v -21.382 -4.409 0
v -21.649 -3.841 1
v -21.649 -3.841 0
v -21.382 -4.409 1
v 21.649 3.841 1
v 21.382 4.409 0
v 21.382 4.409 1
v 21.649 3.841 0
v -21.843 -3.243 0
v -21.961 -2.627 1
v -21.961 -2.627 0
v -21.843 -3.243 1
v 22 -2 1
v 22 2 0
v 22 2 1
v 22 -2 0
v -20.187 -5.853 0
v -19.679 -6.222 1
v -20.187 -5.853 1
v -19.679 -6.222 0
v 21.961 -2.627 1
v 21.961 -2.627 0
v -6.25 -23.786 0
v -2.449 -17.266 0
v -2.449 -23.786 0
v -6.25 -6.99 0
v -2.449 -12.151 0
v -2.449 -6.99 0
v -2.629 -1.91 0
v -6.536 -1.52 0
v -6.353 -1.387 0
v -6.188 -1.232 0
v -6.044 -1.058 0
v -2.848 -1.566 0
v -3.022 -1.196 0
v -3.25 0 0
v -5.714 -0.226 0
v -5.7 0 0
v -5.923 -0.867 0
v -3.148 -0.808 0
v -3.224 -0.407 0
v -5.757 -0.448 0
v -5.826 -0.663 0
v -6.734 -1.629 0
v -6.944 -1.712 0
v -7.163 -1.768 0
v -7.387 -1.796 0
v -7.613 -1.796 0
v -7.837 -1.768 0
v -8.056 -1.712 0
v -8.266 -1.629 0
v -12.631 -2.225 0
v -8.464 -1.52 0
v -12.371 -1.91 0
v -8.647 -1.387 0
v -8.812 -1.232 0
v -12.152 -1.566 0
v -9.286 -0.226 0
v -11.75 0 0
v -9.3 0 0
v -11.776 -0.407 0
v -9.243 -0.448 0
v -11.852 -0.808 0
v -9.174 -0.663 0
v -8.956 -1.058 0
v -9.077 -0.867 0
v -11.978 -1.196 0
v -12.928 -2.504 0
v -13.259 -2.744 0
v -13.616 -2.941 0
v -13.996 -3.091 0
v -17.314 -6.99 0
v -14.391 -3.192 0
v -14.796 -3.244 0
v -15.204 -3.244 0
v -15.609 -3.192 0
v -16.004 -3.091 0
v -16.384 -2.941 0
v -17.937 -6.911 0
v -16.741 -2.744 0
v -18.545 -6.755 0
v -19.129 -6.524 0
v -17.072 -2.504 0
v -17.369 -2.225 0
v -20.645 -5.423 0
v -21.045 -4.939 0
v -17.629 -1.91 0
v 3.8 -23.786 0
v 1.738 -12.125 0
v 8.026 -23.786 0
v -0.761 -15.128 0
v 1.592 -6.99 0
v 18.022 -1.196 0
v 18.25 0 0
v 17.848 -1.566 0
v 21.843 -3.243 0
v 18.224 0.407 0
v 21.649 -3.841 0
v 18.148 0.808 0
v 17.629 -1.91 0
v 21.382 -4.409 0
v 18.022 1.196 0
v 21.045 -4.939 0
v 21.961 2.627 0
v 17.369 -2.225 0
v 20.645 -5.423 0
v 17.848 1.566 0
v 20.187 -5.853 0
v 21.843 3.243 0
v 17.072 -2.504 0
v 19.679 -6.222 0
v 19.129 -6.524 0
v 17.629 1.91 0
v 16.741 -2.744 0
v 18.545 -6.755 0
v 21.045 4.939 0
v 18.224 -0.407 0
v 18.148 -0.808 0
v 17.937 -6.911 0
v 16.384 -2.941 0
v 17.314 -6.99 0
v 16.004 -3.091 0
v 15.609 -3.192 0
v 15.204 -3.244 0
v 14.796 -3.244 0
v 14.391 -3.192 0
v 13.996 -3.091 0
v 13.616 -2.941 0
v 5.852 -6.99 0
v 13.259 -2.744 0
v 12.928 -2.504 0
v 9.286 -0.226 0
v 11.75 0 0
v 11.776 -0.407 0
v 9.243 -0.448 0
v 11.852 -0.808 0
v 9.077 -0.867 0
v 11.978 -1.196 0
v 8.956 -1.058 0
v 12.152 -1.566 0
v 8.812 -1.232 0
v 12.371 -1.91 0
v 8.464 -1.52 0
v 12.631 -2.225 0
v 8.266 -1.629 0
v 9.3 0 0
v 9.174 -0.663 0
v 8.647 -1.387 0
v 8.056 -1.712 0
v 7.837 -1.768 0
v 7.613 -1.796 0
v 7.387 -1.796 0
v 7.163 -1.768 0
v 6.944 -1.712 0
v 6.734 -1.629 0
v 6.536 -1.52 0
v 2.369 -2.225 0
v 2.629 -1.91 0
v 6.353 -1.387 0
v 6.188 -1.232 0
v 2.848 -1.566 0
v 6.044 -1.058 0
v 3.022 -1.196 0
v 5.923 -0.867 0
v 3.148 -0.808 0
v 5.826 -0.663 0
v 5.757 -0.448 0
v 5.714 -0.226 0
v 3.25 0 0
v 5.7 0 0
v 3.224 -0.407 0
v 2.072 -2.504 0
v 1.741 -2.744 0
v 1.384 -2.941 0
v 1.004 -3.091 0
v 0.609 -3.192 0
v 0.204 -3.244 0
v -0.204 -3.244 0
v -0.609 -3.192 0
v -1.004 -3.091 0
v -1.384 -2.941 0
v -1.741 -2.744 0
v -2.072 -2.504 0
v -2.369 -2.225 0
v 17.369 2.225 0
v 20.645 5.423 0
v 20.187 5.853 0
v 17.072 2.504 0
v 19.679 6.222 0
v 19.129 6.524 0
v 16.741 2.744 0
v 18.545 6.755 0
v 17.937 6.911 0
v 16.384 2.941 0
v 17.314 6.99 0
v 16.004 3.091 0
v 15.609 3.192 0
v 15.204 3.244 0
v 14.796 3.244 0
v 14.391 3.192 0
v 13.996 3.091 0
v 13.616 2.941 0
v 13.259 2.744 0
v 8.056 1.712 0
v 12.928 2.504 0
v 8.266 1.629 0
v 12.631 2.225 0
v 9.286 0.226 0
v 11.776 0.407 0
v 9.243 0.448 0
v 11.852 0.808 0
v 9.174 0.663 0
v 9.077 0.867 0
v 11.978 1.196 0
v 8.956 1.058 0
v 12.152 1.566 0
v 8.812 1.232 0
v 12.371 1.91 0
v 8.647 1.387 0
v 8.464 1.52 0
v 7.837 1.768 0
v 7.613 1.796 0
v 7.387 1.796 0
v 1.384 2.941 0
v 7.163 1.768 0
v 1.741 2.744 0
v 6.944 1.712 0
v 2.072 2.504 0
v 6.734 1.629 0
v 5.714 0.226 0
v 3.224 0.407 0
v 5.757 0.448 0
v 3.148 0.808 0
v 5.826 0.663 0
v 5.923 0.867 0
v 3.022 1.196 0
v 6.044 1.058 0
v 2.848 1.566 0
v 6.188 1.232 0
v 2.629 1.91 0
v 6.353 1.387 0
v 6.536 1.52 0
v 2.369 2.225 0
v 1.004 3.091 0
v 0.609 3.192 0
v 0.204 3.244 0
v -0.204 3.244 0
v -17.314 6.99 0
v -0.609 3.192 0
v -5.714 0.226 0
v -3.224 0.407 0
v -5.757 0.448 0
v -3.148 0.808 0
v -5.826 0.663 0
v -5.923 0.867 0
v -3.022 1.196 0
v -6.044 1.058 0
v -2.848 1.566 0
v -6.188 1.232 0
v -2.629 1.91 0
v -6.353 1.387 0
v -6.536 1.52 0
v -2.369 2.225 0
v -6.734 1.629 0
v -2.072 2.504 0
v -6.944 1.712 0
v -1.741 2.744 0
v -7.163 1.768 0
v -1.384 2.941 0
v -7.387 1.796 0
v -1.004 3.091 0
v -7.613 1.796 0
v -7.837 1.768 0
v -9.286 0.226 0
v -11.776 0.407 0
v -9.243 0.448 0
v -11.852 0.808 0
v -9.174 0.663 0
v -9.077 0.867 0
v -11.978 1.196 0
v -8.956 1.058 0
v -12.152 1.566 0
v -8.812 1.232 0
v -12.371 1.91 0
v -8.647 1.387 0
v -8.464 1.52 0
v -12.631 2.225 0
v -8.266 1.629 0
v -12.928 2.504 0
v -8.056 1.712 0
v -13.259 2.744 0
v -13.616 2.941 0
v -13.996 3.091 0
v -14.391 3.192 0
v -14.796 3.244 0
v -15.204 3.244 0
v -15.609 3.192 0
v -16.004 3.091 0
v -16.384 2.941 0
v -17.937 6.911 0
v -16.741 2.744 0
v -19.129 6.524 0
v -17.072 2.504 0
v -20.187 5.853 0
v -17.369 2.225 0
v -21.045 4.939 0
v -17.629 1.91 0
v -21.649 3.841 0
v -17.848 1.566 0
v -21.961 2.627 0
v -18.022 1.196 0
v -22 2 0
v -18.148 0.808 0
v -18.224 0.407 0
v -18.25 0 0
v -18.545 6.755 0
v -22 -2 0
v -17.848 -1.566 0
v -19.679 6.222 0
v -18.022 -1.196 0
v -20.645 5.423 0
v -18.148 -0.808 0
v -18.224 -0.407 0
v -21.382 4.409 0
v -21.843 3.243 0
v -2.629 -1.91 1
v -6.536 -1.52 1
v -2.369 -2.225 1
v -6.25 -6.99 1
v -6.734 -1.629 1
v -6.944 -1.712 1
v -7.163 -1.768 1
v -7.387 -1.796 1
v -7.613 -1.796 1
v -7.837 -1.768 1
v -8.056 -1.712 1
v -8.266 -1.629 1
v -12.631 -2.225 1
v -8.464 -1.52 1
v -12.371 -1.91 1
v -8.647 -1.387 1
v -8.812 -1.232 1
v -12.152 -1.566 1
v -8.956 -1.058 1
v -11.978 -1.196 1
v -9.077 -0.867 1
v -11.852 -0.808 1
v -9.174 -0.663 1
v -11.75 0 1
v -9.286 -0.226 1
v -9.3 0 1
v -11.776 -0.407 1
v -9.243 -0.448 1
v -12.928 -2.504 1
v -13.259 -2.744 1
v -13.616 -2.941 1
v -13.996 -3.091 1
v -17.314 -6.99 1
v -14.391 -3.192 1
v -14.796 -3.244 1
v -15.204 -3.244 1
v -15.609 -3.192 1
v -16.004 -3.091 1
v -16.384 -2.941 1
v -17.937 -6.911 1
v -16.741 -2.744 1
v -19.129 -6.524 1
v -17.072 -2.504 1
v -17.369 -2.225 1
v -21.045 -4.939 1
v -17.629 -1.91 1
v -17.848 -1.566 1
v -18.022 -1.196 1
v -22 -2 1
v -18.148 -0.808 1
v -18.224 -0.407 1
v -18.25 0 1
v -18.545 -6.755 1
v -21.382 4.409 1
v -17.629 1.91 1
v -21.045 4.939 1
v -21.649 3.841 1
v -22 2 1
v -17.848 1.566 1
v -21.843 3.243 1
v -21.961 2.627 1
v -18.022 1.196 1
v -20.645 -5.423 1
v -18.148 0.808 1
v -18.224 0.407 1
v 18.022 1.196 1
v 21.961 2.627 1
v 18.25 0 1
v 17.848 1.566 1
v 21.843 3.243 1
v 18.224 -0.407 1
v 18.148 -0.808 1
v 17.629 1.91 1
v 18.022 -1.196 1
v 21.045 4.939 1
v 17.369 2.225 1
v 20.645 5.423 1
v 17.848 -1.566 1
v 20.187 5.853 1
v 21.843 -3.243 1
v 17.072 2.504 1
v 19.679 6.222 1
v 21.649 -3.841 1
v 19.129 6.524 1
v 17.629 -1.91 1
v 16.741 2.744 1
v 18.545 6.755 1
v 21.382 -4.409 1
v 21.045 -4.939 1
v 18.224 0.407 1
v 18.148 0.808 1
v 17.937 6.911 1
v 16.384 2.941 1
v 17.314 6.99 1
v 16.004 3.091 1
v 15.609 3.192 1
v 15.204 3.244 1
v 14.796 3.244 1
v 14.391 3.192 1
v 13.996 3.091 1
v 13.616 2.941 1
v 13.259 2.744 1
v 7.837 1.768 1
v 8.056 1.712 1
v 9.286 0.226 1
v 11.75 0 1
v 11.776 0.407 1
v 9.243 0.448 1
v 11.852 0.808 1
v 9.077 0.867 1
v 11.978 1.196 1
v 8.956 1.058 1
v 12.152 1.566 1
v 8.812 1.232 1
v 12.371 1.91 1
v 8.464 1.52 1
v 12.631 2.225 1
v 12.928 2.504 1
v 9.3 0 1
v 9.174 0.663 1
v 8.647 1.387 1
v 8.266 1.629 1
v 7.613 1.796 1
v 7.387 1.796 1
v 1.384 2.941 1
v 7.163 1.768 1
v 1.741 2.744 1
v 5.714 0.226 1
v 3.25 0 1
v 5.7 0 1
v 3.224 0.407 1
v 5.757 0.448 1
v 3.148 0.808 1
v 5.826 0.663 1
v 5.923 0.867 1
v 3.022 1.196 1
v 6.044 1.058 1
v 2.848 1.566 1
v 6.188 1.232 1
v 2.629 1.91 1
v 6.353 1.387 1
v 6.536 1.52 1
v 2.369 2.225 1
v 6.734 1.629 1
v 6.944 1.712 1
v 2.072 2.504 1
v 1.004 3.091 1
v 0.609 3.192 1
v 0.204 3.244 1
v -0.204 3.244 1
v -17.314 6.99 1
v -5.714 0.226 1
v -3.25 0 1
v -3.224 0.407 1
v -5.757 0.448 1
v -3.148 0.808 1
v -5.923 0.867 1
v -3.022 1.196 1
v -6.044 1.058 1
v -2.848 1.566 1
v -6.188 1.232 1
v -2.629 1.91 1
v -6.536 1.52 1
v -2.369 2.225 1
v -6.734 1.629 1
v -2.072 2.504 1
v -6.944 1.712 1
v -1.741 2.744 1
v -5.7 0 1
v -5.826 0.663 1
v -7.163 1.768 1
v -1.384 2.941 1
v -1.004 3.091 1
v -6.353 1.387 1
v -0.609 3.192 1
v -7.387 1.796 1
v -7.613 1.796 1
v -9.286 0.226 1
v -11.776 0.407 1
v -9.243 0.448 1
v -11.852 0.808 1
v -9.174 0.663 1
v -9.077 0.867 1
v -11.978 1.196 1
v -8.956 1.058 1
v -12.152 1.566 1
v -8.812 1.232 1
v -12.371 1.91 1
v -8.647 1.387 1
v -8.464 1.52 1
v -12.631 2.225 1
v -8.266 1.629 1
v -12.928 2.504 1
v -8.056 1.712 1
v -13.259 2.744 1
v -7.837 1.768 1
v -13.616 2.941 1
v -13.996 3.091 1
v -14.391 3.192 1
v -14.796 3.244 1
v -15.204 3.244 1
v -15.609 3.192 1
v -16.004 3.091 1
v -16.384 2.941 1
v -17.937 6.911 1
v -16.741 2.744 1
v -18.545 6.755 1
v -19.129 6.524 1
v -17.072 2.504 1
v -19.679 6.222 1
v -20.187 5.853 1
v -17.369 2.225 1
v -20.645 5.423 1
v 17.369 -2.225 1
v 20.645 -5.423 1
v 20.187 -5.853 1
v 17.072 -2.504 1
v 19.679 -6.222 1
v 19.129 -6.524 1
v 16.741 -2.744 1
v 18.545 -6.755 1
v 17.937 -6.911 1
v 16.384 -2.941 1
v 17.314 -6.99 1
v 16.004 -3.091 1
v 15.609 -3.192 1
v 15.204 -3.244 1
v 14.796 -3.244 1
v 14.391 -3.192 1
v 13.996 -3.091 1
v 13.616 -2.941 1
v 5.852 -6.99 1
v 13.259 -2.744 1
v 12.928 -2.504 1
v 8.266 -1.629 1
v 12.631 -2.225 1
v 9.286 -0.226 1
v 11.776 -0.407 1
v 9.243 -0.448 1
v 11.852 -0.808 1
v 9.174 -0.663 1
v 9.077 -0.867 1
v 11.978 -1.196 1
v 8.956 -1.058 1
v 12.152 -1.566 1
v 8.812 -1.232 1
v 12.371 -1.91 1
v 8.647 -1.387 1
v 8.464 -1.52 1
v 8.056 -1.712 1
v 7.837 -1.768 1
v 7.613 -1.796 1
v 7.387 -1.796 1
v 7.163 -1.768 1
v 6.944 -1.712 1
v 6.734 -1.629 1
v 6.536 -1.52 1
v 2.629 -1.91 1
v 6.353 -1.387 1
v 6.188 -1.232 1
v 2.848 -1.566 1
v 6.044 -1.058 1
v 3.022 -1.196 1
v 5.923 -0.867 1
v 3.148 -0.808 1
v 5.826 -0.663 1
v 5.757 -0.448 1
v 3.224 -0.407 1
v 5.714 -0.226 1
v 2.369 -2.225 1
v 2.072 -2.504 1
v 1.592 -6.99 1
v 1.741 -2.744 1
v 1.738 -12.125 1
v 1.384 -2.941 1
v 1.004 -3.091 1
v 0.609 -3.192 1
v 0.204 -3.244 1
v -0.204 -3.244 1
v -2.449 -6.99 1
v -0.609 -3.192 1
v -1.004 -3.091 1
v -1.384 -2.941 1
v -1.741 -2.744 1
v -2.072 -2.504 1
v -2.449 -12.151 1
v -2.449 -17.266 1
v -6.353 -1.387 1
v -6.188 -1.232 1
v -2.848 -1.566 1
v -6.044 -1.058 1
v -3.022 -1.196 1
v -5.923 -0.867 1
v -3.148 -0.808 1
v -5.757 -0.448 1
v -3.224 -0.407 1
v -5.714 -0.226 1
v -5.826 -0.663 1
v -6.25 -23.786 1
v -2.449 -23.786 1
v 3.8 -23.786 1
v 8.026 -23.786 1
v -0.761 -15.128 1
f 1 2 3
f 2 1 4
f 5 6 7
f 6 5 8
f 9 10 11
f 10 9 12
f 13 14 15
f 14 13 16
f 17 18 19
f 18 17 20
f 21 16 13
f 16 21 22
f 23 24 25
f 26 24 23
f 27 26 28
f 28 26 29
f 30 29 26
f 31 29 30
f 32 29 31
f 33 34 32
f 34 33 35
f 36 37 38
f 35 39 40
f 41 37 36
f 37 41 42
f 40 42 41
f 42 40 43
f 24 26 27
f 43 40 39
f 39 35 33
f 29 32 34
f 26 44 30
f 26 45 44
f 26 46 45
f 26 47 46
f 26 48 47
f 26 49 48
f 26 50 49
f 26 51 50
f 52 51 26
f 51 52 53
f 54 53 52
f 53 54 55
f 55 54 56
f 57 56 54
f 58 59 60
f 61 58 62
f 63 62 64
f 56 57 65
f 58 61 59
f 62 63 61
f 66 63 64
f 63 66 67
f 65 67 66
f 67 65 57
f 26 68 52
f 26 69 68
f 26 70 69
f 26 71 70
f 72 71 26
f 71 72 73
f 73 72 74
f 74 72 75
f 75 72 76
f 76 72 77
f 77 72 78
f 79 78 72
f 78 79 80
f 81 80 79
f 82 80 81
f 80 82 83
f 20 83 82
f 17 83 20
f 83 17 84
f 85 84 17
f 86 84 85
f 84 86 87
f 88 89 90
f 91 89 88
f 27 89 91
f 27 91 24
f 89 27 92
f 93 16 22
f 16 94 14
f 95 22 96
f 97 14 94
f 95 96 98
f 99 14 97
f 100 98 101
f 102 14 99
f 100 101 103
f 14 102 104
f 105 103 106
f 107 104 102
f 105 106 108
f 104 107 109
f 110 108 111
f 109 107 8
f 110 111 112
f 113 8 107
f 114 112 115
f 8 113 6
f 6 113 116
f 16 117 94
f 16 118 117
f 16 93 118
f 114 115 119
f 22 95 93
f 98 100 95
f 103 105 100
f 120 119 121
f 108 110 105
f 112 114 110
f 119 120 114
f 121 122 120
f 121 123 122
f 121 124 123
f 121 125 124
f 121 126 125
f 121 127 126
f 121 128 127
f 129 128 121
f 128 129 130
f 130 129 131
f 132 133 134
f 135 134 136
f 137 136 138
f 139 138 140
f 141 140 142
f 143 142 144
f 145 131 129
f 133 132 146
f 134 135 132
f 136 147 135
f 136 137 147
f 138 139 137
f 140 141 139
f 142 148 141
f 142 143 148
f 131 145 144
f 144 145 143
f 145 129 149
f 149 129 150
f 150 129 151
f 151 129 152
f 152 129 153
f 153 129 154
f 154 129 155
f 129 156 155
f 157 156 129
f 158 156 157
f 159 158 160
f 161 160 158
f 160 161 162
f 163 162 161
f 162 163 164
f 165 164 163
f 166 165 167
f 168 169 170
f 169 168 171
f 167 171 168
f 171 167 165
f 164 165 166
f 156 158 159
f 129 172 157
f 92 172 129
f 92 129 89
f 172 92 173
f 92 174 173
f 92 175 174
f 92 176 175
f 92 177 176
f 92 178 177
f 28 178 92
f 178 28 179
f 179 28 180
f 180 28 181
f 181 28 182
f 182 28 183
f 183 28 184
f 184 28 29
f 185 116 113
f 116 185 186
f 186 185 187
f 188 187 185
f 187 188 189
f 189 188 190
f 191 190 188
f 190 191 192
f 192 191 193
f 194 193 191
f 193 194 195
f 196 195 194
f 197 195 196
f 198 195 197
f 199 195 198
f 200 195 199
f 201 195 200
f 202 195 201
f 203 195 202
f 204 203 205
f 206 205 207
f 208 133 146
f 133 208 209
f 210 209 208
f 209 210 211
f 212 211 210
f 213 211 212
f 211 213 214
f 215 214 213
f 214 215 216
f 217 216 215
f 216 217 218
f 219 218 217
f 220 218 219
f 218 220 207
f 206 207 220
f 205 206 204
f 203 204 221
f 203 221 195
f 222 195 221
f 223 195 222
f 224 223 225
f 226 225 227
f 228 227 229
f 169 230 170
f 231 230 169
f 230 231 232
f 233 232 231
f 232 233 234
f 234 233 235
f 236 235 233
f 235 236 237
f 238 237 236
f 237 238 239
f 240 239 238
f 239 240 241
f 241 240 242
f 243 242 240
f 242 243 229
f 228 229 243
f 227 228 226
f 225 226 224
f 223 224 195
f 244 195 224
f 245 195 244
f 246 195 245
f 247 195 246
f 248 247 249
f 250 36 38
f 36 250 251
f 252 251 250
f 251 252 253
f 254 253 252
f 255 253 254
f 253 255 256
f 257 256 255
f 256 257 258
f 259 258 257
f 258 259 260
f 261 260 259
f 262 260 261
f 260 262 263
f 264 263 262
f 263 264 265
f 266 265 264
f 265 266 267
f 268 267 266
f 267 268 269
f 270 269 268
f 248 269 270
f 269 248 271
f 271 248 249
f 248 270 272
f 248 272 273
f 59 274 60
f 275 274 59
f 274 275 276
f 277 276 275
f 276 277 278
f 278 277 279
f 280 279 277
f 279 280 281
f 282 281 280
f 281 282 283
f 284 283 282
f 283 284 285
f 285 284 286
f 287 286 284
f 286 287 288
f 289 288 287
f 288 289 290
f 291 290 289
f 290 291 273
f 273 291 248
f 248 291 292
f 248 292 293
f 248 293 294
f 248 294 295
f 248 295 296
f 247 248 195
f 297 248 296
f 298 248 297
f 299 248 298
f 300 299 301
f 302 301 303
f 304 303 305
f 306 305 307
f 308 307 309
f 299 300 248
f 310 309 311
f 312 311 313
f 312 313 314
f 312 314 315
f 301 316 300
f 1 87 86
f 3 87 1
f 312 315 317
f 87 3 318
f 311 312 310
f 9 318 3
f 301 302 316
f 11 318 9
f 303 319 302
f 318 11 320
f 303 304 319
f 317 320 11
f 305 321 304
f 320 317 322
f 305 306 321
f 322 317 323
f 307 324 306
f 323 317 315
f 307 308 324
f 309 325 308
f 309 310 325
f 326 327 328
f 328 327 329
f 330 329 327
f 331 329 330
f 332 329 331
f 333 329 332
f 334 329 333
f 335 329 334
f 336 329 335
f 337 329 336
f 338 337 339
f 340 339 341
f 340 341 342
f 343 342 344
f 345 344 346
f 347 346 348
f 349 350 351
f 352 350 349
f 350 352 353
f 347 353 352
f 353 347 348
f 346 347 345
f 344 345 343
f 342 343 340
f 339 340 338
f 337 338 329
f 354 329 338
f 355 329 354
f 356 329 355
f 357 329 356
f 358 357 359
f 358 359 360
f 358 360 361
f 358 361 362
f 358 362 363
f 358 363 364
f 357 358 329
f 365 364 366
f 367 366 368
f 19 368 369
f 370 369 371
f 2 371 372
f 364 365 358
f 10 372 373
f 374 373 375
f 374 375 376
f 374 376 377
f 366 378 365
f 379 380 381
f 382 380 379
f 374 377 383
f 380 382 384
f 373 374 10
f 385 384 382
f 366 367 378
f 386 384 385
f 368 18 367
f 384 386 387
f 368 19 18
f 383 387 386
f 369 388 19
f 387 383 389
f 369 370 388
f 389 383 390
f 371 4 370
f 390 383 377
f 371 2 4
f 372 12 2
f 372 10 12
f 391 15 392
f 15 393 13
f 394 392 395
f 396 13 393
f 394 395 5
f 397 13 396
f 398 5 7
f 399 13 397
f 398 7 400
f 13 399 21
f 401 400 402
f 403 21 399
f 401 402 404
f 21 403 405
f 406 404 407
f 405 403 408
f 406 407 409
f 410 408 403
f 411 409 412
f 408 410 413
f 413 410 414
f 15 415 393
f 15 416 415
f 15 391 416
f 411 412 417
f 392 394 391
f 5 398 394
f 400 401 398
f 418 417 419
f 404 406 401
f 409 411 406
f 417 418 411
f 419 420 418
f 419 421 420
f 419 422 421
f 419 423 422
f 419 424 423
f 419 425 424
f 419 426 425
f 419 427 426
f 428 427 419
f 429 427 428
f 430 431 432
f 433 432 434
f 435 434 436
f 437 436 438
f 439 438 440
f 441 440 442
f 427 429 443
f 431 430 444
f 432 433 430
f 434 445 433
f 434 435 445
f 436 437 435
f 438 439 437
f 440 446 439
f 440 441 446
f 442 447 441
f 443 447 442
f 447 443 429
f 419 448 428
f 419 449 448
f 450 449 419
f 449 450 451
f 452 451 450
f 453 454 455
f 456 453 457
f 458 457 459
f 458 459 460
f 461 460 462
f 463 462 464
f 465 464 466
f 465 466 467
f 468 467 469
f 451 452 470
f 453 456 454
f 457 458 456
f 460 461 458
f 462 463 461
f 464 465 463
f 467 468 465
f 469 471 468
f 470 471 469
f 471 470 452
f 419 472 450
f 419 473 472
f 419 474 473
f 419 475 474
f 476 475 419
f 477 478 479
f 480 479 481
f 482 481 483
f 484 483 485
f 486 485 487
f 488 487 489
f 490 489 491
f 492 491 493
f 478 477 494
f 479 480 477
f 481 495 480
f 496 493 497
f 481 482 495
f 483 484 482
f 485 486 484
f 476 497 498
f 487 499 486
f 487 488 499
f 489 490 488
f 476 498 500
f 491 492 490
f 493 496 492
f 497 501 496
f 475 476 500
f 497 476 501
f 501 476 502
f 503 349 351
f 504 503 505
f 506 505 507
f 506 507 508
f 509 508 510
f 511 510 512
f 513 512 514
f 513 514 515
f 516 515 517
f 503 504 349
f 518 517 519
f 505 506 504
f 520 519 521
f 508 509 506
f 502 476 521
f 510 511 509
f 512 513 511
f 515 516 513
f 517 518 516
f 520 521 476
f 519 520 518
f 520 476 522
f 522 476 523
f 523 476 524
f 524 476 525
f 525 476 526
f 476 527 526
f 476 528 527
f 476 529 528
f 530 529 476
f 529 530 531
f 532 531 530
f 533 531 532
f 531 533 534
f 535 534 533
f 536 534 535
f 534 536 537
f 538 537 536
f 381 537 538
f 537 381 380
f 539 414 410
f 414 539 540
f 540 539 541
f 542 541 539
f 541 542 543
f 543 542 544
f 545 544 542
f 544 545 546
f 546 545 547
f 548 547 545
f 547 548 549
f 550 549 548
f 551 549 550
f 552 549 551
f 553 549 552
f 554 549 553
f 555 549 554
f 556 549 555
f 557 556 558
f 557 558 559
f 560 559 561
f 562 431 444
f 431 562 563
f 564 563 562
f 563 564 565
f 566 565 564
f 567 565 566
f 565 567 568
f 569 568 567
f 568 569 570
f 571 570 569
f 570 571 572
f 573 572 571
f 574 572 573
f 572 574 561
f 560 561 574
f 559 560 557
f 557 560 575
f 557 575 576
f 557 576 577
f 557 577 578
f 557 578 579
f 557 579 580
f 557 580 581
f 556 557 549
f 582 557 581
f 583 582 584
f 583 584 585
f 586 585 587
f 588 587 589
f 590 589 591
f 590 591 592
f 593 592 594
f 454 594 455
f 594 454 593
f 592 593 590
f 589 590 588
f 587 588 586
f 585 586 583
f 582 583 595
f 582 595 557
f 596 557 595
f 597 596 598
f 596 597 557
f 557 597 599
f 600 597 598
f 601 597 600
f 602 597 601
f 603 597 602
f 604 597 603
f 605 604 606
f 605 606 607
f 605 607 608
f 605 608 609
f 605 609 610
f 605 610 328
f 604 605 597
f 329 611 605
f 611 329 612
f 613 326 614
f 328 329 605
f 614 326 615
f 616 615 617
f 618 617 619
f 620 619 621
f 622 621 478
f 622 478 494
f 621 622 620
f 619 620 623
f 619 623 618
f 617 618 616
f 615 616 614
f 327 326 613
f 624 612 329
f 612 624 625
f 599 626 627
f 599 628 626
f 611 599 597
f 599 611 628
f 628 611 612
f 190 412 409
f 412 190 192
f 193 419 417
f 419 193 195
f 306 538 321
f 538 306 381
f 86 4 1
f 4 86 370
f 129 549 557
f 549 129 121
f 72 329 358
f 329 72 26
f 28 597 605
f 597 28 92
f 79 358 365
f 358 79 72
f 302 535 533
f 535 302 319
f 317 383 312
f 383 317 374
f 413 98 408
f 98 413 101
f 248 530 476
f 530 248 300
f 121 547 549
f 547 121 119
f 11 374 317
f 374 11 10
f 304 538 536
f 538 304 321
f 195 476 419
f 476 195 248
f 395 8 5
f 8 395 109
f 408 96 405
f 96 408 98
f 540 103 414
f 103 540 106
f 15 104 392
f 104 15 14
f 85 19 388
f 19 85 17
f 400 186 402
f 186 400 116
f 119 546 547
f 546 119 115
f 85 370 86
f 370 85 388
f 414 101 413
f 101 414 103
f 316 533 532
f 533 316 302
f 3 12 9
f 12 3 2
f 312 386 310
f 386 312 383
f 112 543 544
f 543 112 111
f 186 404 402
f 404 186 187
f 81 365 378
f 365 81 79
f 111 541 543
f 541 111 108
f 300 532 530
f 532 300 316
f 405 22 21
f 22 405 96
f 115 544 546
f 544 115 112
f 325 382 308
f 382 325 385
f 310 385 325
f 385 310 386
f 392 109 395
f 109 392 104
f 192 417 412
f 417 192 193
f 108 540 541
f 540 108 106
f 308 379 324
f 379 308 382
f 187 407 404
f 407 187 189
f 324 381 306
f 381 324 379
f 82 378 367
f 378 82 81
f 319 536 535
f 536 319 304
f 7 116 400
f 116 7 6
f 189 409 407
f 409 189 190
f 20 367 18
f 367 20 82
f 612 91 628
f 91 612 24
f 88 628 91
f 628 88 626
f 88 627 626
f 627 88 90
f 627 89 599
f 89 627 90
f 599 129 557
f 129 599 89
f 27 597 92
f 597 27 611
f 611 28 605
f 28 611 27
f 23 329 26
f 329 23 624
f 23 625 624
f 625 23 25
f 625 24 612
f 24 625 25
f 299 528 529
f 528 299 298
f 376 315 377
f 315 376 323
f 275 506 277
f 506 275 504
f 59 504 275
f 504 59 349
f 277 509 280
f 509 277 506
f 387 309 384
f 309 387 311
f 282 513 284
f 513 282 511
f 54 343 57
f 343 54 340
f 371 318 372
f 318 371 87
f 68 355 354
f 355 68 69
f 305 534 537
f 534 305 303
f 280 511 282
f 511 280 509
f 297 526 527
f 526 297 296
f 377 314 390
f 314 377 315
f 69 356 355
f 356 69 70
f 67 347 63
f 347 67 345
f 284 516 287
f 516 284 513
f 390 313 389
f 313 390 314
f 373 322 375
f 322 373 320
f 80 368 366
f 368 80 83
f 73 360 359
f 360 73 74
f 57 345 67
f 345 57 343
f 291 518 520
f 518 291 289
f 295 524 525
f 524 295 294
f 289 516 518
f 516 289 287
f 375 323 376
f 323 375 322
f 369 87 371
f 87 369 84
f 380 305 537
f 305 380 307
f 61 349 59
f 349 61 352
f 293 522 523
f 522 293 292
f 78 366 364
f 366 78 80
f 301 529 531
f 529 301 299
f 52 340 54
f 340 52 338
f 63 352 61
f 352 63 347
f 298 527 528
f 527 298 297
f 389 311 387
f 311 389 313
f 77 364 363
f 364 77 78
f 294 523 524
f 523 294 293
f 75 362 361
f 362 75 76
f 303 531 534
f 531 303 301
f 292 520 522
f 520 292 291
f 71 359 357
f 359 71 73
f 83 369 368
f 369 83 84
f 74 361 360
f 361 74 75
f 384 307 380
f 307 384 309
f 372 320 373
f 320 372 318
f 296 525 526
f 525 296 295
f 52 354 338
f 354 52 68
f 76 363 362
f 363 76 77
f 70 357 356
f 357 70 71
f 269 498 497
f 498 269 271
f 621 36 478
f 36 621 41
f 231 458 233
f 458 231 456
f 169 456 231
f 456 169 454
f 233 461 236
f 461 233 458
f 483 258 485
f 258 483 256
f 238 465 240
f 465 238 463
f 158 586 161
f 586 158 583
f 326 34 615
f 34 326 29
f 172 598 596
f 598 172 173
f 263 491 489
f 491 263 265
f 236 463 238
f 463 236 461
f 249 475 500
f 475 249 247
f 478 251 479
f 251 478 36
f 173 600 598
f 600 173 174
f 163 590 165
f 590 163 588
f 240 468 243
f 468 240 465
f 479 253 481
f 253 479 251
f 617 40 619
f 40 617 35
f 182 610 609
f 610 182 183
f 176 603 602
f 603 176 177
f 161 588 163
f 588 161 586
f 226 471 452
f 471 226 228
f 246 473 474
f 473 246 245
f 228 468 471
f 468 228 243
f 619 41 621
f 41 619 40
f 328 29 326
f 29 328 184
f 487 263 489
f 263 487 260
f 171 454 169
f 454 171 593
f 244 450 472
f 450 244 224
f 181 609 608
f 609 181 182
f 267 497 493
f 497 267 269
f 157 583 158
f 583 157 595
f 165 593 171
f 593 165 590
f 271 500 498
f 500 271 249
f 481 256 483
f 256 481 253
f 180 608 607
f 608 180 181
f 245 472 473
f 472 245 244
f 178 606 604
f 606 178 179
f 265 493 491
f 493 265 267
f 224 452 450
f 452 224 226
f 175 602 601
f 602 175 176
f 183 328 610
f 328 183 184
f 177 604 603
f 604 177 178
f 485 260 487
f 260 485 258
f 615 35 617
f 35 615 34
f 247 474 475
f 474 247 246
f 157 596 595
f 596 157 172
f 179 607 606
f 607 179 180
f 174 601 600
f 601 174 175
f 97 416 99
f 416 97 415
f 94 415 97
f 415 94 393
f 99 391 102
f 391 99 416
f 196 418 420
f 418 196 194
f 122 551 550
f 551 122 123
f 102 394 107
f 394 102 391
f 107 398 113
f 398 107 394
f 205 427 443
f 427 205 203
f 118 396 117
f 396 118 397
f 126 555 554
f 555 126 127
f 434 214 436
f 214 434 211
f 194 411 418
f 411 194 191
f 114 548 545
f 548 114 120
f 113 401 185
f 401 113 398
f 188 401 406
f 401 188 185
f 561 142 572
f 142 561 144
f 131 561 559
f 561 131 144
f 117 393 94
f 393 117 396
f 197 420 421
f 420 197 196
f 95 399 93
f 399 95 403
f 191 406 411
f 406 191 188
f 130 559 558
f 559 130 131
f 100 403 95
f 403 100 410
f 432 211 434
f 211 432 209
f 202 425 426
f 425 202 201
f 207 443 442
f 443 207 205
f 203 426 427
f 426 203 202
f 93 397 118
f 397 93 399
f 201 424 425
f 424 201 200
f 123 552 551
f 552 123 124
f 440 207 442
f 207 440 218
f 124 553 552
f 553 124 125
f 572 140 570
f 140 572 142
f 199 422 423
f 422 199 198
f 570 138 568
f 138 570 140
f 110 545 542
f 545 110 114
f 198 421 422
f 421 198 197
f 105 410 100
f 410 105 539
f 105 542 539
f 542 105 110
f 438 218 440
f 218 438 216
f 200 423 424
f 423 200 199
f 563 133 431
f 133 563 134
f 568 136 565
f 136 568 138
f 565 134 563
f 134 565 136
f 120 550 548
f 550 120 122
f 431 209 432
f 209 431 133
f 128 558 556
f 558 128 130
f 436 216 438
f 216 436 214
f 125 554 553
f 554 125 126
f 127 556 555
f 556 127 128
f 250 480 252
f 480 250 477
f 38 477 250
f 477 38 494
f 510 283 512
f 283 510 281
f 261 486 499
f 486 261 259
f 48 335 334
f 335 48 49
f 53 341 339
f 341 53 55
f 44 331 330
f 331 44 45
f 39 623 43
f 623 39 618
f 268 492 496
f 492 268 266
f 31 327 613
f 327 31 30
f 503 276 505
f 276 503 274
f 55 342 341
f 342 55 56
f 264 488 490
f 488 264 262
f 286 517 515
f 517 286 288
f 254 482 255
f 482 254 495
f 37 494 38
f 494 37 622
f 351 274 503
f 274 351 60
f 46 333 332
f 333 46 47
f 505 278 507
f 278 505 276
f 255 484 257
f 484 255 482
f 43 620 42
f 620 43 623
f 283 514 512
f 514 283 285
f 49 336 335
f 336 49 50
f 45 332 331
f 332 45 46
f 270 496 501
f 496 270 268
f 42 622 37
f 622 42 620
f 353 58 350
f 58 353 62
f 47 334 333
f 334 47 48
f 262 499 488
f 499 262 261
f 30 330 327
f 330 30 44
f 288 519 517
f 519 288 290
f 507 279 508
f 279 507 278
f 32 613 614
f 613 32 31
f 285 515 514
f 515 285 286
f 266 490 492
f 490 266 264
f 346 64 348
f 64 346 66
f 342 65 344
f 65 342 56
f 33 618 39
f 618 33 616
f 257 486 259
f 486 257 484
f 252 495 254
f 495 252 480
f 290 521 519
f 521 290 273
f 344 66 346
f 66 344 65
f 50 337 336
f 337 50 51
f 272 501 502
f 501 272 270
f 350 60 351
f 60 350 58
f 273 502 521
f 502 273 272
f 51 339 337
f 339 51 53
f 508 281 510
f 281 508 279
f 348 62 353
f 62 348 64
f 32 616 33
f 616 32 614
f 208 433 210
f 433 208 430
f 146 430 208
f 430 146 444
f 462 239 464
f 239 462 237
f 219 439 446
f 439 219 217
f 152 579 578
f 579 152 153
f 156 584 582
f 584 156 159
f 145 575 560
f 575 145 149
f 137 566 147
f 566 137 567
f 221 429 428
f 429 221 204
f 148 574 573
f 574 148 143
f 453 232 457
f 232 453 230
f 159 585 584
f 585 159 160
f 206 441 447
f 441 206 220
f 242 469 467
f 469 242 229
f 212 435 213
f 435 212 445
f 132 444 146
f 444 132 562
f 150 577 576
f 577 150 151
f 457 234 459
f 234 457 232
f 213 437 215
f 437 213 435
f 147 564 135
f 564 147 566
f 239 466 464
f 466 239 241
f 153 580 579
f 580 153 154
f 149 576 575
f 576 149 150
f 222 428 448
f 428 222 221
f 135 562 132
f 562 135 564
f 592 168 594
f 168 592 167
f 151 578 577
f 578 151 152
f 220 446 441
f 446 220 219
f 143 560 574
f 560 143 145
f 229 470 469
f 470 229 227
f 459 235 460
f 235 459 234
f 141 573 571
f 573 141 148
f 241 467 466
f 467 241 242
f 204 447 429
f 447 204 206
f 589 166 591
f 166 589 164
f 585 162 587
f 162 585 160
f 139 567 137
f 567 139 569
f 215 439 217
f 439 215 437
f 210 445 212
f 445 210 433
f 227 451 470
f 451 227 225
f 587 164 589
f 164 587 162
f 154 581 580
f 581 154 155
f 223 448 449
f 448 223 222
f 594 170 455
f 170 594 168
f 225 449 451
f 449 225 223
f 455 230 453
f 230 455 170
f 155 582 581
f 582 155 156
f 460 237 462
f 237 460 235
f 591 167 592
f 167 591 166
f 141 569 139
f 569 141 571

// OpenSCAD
$fn = 50;


difference() {
	union() {
		hull() {
			translate(v = [-17.0000000000, 2.0000000000, 0]) {
				cylinder(h = 1, r = 5);
			}
			translate(v = [17.0000000000, 2.0000000000, 0]) {
				cylinder(h = 1, r = 5);
			}
			translate(v = [-17.0000000000, -2.0000000000, 0]) {
				cylinder(h = 1, r = 5);
			}
			translate(v = [17.0000000000, -2.0000000000, 0]) {
				cylinder(h = 1, r = 5);
			}
		}
		translate(v = [0, -5, 0]) {
			linear_extrude(height = 1) {
				text(font = "DejaVu Sans Mono:style=Bold", halign = "center", size = 19.0000000000, text = "K", valign = "top");
			}
		}
	}
	union() {
		translate(v = [-15.0000000000, 0.0000000000, 0]) {
			translate(v = [0, 0, -100]) {
				cylinder(h = 200, r = 3.2500000000);
			}
		}
		translate(v = [0, 0, -100]) {
			cylinder(h = 200, r = 3.2500000000);
		}
		translate(v = [15.0000000000, 0.0000000000, 0]) {
			translate(v = [0, 0, -100]) {
				cylinder(h = 200, r = 3.2500000000);
			}
		}
		translate(v = [-15.0000000000, 0.0000000000, 0]) {
			translate(v = [0, 0, -100]) {
				cylinder(h = 200, r = 1.8000000000);
			}
		}
		translate(v = [-7.5000000000, 0.0000000000, 0]) {
			translate(v = [0, 0, -100]) {
				cylinder(h = 200, r = 1.8000000000);
			}
		}
		translate(v = [0, 0, -100]) {
			cylinder(h = 200, r = 1.8000000000);
		}
		translate(v = [7.5000000000, 0.0000000000, 0]) {
			translate(v = [0, 0, -100]) {
				cylinder(h = 200, r = 1.8000000000);
			}
		}
		translate(v = [15.0000000000, 0.0000000000, 0]) {
			translate(v = [0, 0, -100]) {
				cylinder(h = 200, r = 1.8000000000);
			}
		}
	}
}
